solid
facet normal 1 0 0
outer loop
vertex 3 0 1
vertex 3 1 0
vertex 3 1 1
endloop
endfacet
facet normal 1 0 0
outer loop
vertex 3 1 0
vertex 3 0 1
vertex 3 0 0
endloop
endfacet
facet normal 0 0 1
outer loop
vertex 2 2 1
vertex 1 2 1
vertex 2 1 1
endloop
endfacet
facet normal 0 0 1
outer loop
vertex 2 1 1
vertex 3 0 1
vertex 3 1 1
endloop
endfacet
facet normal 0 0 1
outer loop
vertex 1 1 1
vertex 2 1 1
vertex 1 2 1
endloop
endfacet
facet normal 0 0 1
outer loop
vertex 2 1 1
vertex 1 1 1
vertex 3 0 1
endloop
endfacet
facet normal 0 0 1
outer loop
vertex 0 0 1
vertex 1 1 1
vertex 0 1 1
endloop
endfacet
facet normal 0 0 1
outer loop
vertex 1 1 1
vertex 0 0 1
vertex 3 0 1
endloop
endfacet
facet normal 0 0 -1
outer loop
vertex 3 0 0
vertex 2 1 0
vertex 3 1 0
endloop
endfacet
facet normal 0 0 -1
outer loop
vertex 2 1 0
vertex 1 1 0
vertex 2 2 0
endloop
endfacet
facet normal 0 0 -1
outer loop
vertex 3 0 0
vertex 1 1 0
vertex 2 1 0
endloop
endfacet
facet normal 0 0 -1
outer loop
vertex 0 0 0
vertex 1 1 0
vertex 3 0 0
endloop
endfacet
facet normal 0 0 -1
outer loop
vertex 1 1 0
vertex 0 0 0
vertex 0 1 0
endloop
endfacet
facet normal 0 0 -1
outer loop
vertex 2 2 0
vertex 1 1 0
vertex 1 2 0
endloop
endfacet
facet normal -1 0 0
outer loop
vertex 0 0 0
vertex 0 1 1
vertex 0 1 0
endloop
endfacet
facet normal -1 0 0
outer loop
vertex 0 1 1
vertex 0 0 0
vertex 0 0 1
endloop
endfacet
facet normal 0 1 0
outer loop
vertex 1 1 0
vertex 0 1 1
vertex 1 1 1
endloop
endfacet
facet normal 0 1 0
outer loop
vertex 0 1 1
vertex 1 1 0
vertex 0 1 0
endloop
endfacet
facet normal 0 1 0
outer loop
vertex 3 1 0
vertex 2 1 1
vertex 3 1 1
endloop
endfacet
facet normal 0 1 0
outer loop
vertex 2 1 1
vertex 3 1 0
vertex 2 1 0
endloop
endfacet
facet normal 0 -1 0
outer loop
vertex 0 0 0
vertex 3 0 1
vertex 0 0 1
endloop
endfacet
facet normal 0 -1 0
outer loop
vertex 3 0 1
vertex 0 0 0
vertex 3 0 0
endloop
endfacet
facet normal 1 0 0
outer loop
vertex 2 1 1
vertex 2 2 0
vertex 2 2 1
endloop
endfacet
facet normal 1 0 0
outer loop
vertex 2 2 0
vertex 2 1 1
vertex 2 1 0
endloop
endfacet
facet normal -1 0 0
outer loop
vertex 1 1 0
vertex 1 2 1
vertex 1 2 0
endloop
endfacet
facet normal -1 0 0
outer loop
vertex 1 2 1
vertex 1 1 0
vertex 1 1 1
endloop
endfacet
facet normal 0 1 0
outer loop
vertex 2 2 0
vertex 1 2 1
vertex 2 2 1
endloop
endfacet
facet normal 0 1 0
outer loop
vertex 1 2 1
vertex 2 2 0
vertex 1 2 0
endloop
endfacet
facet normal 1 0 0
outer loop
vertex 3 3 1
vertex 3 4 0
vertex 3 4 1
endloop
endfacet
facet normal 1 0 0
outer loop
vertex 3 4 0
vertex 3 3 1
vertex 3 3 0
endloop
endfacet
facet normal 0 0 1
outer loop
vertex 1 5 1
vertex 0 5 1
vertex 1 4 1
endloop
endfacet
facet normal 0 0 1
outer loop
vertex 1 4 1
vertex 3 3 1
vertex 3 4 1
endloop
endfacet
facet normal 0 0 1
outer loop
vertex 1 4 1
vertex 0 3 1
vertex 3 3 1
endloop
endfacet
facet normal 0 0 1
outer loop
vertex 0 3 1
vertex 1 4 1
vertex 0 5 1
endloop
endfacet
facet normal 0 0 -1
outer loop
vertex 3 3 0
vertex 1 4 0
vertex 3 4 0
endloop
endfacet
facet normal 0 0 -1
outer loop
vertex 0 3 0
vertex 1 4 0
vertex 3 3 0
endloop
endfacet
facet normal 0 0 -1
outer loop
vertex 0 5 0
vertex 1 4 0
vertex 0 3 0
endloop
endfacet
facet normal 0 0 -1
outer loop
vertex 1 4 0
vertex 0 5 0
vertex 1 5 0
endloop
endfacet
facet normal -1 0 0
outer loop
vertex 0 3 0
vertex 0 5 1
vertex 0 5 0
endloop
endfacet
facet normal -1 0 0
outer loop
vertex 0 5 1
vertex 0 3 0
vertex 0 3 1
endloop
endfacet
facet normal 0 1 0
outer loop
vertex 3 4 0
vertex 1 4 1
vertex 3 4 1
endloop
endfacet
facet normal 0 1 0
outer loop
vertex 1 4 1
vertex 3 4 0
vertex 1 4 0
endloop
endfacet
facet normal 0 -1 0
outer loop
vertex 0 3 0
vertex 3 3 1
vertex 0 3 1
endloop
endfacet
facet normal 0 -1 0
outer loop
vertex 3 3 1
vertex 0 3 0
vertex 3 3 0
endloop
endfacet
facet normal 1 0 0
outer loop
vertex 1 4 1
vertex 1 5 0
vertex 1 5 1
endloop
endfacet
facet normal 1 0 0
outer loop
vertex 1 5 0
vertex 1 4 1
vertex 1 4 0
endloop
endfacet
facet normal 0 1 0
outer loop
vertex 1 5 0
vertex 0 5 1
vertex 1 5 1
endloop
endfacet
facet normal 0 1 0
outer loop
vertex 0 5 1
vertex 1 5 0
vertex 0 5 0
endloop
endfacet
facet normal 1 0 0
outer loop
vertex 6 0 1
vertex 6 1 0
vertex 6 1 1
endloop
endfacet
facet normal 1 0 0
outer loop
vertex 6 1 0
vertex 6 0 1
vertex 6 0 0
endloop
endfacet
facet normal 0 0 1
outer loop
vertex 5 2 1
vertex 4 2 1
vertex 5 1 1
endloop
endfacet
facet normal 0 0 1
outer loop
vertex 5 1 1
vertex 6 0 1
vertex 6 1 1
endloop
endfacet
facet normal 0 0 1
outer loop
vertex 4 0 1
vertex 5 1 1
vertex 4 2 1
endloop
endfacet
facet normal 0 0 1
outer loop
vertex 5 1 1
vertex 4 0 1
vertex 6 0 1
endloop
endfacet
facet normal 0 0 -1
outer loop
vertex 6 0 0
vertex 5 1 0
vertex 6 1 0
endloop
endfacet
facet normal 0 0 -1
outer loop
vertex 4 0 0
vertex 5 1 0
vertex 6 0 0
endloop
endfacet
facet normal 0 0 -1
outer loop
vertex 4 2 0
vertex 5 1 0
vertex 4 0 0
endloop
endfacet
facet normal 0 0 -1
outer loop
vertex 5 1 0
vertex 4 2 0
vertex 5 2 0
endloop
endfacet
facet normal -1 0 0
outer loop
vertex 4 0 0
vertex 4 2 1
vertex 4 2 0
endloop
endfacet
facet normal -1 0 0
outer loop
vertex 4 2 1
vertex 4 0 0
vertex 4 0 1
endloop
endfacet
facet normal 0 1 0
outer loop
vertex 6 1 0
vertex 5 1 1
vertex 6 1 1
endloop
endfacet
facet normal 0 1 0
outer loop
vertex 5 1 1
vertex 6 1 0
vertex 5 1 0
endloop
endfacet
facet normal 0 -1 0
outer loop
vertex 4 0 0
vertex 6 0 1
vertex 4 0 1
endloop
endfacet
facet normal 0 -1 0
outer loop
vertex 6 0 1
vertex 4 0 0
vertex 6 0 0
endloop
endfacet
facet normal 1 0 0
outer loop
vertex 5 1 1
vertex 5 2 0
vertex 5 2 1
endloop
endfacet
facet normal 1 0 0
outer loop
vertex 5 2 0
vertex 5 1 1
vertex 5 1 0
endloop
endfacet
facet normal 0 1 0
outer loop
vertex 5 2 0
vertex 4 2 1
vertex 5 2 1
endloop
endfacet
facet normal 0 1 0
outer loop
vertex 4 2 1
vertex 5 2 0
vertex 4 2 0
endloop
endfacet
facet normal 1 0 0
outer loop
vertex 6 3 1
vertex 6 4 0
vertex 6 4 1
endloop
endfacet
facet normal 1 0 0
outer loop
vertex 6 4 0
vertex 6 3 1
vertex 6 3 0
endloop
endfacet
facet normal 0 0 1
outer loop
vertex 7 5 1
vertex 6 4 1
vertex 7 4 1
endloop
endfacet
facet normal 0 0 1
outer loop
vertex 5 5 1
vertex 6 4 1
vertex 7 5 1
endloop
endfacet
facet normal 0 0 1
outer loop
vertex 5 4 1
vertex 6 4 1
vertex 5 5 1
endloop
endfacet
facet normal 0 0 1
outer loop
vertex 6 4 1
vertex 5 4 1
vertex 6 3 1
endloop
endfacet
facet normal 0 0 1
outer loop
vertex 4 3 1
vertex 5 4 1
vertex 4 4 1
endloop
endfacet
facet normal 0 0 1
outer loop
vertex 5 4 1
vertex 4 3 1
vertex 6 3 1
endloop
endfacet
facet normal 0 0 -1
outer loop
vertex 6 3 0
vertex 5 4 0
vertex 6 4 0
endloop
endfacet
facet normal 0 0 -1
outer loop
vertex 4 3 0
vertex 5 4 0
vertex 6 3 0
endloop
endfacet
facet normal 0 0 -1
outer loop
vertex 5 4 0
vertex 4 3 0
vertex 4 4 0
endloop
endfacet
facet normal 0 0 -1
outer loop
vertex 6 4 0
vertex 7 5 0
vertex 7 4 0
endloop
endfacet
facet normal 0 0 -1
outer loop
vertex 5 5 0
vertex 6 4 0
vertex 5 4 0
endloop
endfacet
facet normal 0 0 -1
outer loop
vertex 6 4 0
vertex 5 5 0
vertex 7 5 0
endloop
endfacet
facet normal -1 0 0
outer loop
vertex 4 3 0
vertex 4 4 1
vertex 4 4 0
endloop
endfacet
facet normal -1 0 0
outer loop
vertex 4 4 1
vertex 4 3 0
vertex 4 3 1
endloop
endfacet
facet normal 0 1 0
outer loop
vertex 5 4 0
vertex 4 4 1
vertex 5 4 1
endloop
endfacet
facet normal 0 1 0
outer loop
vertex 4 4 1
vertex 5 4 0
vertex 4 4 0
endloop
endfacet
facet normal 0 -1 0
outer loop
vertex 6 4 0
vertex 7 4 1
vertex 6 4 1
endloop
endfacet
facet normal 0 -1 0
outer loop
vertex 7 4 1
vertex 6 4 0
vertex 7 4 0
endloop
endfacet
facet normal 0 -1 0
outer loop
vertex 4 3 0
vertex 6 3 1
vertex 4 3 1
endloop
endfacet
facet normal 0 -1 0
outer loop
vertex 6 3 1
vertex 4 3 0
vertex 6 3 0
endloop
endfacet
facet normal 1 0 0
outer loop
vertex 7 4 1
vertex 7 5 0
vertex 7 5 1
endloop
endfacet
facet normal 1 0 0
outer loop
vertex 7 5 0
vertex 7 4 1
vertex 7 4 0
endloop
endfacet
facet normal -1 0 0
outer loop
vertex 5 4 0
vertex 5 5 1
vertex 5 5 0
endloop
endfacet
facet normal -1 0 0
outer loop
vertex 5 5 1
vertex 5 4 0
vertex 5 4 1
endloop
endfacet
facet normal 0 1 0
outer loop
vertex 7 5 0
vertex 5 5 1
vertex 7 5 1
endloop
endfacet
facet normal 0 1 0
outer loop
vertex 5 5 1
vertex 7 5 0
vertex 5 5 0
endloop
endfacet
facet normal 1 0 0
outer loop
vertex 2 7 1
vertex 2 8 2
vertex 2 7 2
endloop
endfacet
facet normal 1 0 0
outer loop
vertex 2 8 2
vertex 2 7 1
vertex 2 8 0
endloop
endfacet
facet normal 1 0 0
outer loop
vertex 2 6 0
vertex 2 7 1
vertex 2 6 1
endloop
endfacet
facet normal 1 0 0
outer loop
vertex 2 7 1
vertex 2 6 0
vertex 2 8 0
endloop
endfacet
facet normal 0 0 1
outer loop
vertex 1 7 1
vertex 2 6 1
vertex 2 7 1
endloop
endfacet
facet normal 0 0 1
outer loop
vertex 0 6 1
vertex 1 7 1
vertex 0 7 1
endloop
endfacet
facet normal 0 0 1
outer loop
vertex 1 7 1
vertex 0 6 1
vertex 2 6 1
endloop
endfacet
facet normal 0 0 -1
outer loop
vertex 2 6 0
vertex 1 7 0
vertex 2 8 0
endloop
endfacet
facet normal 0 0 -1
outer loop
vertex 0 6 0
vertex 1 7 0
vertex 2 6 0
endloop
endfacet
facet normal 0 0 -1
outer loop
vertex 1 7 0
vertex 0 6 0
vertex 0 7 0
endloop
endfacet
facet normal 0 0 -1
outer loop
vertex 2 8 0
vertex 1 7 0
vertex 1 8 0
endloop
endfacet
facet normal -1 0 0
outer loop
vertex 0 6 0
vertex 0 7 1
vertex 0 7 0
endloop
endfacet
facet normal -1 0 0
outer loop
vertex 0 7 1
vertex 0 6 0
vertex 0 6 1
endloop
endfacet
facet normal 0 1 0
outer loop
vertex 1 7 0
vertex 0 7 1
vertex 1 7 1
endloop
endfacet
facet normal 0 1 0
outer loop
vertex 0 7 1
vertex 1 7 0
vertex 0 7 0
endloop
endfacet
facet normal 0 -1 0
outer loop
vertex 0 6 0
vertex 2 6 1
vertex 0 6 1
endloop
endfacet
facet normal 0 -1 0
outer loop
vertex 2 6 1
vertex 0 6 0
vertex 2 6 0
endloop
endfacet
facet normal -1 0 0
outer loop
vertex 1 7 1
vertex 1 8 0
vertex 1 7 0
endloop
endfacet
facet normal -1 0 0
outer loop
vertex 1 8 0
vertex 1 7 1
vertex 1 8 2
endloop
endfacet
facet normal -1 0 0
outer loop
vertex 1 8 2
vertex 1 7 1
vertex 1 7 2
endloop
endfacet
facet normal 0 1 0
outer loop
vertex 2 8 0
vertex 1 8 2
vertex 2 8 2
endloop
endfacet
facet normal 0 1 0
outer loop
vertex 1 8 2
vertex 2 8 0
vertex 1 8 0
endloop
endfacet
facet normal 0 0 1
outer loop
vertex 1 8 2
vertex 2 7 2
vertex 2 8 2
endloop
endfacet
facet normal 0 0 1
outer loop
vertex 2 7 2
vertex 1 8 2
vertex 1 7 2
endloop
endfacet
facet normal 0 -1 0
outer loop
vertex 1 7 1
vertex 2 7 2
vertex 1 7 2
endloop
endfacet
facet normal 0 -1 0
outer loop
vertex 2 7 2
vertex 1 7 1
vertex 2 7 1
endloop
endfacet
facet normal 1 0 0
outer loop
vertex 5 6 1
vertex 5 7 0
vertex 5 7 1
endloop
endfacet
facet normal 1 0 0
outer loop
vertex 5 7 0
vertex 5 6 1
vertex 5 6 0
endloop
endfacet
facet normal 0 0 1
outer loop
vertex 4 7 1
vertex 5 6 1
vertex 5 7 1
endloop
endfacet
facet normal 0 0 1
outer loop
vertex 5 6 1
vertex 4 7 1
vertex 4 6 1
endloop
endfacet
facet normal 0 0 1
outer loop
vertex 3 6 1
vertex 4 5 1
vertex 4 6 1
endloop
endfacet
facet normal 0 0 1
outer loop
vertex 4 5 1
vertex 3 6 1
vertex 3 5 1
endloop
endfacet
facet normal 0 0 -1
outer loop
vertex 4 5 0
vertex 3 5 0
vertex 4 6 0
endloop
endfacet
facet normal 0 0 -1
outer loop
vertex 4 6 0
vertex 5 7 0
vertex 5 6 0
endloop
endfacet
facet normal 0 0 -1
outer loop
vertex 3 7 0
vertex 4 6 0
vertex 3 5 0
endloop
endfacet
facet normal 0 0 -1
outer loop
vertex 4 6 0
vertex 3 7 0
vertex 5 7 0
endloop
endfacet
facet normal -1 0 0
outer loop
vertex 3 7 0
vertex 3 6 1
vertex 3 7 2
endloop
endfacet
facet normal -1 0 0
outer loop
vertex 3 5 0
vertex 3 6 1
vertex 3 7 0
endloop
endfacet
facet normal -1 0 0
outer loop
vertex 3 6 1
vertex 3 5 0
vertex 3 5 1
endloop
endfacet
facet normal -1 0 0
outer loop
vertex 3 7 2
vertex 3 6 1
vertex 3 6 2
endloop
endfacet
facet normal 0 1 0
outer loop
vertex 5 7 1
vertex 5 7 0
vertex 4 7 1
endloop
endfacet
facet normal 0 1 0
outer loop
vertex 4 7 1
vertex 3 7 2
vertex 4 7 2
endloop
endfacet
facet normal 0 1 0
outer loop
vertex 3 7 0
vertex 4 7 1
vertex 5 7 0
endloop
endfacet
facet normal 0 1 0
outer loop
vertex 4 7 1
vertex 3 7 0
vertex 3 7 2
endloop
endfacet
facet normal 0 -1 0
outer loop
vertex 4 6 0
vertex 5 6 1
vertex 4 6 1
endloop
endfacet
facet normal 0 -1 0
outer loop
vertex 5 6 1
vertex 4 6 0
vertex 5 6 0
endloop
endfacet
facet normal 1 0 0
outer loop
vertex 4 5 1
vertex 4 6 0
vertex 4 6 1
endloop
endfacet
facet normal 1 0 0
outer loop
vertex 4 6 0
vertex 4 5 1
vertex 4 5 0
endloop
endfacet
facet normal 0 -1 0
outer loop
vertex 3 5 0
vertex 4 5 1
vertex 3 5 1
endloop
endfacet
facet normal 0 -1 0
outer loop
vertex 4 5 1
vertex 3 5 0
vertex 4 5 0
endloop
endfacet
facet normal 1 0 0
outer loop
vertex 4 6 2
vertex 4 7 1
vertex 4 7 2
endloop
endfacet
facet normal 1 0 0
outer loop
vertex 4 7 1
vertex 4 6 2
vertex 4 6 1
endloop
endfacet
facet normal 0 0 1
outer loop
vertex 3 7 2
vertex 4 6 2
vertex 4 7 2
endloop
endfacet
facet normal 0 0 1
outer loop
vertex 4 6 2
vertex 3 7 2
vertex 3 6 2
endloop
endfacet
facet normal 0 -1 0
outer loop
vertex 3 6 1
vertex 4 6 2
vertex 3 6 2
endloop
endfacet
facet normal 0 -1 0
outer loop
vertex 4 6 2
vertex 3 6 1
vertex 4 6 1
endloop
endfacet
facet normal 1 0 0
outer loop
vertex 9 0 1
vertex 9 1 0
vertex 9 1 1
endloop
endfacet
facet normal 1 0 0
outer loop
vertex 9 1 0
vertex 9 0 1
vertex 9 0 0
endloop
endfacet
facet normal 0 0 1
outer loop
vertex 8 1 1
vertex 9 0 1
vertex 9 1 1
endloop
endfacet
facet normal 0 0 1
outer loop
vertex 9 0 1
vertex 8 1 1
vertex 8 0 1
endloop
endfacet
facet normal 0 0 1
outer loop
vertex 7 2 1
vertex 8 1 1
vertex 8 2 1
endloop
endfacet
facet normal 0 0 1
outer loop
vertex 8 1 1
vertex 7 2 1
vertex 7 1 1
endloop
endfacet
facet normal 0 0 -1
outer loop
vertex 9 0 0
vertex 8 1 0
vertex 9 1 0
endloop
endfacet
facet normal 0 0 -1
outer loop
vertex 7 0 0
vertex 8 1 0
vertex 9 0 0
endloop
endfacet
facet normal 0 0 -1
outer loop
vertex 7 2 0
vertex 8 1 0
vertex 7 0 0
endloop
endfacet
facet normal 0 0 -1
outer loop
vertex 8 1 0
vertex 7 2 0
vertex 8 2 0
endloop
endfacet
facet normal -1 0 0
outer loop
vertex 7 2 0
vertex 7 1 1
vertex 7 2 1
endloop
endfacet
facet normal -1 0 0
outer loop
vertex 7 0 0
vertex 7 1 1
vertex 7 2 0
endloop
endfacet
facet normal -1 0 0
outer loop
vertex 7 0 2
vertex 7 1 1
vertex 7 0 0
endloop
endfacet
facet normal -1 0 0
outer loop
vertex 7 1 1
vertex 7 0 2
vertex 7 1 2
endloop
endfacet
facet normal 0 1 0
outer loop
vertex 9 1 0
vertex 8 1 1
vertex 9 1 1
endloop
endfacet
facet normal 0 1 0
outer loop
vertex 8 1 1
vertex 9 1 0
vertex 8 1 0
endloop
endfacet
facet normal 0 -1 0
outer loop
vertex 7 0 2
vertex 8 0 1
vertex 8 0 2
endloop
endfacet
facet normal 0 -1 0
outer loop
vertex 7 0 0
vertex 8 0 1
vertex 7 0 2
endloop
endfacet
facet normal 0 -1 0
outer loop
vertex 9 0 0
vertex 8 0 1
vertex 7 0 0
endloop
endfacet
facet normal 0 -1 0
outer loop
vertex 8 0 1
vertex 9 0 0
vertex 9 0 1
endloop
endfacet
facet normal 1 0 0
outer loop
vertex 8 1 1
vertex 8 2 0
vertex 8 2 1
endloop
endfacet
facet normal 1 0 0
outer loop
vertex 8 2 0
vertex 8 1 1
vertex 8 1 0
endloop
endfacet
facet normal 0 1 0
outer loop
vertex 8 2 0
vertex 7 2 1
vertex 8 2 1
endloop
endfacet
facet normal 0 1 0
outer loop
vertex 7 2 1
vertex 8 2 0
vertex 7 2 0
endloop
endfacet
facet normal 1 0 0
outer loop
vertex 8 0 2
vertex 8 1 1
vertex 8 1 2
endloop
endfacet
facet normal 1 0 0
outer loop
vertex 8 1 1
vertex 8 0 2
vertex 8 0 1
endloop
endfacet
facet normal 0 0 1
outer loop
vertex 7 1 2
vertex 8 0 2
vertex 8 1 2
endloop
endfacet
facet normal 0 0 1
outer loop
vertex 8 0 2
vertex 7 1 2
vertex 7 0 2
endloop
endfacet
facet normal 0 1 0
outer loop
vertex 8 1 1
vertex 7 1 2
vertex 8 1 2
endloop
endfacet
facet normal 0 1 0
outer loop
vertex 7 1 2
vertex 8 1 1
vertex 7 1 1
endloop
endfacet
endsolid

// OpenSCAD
union() {
    cube([3, 1, 1]);
    translate([1, 1, 0])
        cube([1, 1, 1]);
}
union() {
    translate([0, 3, 0])
    cube([3, 1, 1]);
    translate([0, 4, 0])
        cube([1, 1, 1]);
}
union() {
    translate([4, 0, 0])
    cube([2, 1, 1]);
    translate([4, 1, 0])
        cube([1, 1, 1]);
}
union() {
    translate([4, 3, 0])
    cube([2, 1, 1]);
    translate([5, 4, 0])
        cube([2, 1, 1]);
}
union() {
    translate([0, 6, 0])
    cube([2, 1, 1]);
    translate([1, 7, 0])
        cube([1, 1, 1]);
    translate([1,7,1])
        cube([1,1,1]);
}

union() {
    translate([3, 6, 0])
    cube([2, 1, 1]);
    translate([3, 5, 0])
        cube([1, 1, 1]);
    translate([3, 6, 1])
        cube([1, 1, 1]);
}
union() {
    translate([7, 0, 0])
    cube([2, 1, 1]);
    translate([7, 1, 0])
        cube([1, 1, 1]);
    translate([7, 0, 1])
        cube([1, 1, 1]);
}
